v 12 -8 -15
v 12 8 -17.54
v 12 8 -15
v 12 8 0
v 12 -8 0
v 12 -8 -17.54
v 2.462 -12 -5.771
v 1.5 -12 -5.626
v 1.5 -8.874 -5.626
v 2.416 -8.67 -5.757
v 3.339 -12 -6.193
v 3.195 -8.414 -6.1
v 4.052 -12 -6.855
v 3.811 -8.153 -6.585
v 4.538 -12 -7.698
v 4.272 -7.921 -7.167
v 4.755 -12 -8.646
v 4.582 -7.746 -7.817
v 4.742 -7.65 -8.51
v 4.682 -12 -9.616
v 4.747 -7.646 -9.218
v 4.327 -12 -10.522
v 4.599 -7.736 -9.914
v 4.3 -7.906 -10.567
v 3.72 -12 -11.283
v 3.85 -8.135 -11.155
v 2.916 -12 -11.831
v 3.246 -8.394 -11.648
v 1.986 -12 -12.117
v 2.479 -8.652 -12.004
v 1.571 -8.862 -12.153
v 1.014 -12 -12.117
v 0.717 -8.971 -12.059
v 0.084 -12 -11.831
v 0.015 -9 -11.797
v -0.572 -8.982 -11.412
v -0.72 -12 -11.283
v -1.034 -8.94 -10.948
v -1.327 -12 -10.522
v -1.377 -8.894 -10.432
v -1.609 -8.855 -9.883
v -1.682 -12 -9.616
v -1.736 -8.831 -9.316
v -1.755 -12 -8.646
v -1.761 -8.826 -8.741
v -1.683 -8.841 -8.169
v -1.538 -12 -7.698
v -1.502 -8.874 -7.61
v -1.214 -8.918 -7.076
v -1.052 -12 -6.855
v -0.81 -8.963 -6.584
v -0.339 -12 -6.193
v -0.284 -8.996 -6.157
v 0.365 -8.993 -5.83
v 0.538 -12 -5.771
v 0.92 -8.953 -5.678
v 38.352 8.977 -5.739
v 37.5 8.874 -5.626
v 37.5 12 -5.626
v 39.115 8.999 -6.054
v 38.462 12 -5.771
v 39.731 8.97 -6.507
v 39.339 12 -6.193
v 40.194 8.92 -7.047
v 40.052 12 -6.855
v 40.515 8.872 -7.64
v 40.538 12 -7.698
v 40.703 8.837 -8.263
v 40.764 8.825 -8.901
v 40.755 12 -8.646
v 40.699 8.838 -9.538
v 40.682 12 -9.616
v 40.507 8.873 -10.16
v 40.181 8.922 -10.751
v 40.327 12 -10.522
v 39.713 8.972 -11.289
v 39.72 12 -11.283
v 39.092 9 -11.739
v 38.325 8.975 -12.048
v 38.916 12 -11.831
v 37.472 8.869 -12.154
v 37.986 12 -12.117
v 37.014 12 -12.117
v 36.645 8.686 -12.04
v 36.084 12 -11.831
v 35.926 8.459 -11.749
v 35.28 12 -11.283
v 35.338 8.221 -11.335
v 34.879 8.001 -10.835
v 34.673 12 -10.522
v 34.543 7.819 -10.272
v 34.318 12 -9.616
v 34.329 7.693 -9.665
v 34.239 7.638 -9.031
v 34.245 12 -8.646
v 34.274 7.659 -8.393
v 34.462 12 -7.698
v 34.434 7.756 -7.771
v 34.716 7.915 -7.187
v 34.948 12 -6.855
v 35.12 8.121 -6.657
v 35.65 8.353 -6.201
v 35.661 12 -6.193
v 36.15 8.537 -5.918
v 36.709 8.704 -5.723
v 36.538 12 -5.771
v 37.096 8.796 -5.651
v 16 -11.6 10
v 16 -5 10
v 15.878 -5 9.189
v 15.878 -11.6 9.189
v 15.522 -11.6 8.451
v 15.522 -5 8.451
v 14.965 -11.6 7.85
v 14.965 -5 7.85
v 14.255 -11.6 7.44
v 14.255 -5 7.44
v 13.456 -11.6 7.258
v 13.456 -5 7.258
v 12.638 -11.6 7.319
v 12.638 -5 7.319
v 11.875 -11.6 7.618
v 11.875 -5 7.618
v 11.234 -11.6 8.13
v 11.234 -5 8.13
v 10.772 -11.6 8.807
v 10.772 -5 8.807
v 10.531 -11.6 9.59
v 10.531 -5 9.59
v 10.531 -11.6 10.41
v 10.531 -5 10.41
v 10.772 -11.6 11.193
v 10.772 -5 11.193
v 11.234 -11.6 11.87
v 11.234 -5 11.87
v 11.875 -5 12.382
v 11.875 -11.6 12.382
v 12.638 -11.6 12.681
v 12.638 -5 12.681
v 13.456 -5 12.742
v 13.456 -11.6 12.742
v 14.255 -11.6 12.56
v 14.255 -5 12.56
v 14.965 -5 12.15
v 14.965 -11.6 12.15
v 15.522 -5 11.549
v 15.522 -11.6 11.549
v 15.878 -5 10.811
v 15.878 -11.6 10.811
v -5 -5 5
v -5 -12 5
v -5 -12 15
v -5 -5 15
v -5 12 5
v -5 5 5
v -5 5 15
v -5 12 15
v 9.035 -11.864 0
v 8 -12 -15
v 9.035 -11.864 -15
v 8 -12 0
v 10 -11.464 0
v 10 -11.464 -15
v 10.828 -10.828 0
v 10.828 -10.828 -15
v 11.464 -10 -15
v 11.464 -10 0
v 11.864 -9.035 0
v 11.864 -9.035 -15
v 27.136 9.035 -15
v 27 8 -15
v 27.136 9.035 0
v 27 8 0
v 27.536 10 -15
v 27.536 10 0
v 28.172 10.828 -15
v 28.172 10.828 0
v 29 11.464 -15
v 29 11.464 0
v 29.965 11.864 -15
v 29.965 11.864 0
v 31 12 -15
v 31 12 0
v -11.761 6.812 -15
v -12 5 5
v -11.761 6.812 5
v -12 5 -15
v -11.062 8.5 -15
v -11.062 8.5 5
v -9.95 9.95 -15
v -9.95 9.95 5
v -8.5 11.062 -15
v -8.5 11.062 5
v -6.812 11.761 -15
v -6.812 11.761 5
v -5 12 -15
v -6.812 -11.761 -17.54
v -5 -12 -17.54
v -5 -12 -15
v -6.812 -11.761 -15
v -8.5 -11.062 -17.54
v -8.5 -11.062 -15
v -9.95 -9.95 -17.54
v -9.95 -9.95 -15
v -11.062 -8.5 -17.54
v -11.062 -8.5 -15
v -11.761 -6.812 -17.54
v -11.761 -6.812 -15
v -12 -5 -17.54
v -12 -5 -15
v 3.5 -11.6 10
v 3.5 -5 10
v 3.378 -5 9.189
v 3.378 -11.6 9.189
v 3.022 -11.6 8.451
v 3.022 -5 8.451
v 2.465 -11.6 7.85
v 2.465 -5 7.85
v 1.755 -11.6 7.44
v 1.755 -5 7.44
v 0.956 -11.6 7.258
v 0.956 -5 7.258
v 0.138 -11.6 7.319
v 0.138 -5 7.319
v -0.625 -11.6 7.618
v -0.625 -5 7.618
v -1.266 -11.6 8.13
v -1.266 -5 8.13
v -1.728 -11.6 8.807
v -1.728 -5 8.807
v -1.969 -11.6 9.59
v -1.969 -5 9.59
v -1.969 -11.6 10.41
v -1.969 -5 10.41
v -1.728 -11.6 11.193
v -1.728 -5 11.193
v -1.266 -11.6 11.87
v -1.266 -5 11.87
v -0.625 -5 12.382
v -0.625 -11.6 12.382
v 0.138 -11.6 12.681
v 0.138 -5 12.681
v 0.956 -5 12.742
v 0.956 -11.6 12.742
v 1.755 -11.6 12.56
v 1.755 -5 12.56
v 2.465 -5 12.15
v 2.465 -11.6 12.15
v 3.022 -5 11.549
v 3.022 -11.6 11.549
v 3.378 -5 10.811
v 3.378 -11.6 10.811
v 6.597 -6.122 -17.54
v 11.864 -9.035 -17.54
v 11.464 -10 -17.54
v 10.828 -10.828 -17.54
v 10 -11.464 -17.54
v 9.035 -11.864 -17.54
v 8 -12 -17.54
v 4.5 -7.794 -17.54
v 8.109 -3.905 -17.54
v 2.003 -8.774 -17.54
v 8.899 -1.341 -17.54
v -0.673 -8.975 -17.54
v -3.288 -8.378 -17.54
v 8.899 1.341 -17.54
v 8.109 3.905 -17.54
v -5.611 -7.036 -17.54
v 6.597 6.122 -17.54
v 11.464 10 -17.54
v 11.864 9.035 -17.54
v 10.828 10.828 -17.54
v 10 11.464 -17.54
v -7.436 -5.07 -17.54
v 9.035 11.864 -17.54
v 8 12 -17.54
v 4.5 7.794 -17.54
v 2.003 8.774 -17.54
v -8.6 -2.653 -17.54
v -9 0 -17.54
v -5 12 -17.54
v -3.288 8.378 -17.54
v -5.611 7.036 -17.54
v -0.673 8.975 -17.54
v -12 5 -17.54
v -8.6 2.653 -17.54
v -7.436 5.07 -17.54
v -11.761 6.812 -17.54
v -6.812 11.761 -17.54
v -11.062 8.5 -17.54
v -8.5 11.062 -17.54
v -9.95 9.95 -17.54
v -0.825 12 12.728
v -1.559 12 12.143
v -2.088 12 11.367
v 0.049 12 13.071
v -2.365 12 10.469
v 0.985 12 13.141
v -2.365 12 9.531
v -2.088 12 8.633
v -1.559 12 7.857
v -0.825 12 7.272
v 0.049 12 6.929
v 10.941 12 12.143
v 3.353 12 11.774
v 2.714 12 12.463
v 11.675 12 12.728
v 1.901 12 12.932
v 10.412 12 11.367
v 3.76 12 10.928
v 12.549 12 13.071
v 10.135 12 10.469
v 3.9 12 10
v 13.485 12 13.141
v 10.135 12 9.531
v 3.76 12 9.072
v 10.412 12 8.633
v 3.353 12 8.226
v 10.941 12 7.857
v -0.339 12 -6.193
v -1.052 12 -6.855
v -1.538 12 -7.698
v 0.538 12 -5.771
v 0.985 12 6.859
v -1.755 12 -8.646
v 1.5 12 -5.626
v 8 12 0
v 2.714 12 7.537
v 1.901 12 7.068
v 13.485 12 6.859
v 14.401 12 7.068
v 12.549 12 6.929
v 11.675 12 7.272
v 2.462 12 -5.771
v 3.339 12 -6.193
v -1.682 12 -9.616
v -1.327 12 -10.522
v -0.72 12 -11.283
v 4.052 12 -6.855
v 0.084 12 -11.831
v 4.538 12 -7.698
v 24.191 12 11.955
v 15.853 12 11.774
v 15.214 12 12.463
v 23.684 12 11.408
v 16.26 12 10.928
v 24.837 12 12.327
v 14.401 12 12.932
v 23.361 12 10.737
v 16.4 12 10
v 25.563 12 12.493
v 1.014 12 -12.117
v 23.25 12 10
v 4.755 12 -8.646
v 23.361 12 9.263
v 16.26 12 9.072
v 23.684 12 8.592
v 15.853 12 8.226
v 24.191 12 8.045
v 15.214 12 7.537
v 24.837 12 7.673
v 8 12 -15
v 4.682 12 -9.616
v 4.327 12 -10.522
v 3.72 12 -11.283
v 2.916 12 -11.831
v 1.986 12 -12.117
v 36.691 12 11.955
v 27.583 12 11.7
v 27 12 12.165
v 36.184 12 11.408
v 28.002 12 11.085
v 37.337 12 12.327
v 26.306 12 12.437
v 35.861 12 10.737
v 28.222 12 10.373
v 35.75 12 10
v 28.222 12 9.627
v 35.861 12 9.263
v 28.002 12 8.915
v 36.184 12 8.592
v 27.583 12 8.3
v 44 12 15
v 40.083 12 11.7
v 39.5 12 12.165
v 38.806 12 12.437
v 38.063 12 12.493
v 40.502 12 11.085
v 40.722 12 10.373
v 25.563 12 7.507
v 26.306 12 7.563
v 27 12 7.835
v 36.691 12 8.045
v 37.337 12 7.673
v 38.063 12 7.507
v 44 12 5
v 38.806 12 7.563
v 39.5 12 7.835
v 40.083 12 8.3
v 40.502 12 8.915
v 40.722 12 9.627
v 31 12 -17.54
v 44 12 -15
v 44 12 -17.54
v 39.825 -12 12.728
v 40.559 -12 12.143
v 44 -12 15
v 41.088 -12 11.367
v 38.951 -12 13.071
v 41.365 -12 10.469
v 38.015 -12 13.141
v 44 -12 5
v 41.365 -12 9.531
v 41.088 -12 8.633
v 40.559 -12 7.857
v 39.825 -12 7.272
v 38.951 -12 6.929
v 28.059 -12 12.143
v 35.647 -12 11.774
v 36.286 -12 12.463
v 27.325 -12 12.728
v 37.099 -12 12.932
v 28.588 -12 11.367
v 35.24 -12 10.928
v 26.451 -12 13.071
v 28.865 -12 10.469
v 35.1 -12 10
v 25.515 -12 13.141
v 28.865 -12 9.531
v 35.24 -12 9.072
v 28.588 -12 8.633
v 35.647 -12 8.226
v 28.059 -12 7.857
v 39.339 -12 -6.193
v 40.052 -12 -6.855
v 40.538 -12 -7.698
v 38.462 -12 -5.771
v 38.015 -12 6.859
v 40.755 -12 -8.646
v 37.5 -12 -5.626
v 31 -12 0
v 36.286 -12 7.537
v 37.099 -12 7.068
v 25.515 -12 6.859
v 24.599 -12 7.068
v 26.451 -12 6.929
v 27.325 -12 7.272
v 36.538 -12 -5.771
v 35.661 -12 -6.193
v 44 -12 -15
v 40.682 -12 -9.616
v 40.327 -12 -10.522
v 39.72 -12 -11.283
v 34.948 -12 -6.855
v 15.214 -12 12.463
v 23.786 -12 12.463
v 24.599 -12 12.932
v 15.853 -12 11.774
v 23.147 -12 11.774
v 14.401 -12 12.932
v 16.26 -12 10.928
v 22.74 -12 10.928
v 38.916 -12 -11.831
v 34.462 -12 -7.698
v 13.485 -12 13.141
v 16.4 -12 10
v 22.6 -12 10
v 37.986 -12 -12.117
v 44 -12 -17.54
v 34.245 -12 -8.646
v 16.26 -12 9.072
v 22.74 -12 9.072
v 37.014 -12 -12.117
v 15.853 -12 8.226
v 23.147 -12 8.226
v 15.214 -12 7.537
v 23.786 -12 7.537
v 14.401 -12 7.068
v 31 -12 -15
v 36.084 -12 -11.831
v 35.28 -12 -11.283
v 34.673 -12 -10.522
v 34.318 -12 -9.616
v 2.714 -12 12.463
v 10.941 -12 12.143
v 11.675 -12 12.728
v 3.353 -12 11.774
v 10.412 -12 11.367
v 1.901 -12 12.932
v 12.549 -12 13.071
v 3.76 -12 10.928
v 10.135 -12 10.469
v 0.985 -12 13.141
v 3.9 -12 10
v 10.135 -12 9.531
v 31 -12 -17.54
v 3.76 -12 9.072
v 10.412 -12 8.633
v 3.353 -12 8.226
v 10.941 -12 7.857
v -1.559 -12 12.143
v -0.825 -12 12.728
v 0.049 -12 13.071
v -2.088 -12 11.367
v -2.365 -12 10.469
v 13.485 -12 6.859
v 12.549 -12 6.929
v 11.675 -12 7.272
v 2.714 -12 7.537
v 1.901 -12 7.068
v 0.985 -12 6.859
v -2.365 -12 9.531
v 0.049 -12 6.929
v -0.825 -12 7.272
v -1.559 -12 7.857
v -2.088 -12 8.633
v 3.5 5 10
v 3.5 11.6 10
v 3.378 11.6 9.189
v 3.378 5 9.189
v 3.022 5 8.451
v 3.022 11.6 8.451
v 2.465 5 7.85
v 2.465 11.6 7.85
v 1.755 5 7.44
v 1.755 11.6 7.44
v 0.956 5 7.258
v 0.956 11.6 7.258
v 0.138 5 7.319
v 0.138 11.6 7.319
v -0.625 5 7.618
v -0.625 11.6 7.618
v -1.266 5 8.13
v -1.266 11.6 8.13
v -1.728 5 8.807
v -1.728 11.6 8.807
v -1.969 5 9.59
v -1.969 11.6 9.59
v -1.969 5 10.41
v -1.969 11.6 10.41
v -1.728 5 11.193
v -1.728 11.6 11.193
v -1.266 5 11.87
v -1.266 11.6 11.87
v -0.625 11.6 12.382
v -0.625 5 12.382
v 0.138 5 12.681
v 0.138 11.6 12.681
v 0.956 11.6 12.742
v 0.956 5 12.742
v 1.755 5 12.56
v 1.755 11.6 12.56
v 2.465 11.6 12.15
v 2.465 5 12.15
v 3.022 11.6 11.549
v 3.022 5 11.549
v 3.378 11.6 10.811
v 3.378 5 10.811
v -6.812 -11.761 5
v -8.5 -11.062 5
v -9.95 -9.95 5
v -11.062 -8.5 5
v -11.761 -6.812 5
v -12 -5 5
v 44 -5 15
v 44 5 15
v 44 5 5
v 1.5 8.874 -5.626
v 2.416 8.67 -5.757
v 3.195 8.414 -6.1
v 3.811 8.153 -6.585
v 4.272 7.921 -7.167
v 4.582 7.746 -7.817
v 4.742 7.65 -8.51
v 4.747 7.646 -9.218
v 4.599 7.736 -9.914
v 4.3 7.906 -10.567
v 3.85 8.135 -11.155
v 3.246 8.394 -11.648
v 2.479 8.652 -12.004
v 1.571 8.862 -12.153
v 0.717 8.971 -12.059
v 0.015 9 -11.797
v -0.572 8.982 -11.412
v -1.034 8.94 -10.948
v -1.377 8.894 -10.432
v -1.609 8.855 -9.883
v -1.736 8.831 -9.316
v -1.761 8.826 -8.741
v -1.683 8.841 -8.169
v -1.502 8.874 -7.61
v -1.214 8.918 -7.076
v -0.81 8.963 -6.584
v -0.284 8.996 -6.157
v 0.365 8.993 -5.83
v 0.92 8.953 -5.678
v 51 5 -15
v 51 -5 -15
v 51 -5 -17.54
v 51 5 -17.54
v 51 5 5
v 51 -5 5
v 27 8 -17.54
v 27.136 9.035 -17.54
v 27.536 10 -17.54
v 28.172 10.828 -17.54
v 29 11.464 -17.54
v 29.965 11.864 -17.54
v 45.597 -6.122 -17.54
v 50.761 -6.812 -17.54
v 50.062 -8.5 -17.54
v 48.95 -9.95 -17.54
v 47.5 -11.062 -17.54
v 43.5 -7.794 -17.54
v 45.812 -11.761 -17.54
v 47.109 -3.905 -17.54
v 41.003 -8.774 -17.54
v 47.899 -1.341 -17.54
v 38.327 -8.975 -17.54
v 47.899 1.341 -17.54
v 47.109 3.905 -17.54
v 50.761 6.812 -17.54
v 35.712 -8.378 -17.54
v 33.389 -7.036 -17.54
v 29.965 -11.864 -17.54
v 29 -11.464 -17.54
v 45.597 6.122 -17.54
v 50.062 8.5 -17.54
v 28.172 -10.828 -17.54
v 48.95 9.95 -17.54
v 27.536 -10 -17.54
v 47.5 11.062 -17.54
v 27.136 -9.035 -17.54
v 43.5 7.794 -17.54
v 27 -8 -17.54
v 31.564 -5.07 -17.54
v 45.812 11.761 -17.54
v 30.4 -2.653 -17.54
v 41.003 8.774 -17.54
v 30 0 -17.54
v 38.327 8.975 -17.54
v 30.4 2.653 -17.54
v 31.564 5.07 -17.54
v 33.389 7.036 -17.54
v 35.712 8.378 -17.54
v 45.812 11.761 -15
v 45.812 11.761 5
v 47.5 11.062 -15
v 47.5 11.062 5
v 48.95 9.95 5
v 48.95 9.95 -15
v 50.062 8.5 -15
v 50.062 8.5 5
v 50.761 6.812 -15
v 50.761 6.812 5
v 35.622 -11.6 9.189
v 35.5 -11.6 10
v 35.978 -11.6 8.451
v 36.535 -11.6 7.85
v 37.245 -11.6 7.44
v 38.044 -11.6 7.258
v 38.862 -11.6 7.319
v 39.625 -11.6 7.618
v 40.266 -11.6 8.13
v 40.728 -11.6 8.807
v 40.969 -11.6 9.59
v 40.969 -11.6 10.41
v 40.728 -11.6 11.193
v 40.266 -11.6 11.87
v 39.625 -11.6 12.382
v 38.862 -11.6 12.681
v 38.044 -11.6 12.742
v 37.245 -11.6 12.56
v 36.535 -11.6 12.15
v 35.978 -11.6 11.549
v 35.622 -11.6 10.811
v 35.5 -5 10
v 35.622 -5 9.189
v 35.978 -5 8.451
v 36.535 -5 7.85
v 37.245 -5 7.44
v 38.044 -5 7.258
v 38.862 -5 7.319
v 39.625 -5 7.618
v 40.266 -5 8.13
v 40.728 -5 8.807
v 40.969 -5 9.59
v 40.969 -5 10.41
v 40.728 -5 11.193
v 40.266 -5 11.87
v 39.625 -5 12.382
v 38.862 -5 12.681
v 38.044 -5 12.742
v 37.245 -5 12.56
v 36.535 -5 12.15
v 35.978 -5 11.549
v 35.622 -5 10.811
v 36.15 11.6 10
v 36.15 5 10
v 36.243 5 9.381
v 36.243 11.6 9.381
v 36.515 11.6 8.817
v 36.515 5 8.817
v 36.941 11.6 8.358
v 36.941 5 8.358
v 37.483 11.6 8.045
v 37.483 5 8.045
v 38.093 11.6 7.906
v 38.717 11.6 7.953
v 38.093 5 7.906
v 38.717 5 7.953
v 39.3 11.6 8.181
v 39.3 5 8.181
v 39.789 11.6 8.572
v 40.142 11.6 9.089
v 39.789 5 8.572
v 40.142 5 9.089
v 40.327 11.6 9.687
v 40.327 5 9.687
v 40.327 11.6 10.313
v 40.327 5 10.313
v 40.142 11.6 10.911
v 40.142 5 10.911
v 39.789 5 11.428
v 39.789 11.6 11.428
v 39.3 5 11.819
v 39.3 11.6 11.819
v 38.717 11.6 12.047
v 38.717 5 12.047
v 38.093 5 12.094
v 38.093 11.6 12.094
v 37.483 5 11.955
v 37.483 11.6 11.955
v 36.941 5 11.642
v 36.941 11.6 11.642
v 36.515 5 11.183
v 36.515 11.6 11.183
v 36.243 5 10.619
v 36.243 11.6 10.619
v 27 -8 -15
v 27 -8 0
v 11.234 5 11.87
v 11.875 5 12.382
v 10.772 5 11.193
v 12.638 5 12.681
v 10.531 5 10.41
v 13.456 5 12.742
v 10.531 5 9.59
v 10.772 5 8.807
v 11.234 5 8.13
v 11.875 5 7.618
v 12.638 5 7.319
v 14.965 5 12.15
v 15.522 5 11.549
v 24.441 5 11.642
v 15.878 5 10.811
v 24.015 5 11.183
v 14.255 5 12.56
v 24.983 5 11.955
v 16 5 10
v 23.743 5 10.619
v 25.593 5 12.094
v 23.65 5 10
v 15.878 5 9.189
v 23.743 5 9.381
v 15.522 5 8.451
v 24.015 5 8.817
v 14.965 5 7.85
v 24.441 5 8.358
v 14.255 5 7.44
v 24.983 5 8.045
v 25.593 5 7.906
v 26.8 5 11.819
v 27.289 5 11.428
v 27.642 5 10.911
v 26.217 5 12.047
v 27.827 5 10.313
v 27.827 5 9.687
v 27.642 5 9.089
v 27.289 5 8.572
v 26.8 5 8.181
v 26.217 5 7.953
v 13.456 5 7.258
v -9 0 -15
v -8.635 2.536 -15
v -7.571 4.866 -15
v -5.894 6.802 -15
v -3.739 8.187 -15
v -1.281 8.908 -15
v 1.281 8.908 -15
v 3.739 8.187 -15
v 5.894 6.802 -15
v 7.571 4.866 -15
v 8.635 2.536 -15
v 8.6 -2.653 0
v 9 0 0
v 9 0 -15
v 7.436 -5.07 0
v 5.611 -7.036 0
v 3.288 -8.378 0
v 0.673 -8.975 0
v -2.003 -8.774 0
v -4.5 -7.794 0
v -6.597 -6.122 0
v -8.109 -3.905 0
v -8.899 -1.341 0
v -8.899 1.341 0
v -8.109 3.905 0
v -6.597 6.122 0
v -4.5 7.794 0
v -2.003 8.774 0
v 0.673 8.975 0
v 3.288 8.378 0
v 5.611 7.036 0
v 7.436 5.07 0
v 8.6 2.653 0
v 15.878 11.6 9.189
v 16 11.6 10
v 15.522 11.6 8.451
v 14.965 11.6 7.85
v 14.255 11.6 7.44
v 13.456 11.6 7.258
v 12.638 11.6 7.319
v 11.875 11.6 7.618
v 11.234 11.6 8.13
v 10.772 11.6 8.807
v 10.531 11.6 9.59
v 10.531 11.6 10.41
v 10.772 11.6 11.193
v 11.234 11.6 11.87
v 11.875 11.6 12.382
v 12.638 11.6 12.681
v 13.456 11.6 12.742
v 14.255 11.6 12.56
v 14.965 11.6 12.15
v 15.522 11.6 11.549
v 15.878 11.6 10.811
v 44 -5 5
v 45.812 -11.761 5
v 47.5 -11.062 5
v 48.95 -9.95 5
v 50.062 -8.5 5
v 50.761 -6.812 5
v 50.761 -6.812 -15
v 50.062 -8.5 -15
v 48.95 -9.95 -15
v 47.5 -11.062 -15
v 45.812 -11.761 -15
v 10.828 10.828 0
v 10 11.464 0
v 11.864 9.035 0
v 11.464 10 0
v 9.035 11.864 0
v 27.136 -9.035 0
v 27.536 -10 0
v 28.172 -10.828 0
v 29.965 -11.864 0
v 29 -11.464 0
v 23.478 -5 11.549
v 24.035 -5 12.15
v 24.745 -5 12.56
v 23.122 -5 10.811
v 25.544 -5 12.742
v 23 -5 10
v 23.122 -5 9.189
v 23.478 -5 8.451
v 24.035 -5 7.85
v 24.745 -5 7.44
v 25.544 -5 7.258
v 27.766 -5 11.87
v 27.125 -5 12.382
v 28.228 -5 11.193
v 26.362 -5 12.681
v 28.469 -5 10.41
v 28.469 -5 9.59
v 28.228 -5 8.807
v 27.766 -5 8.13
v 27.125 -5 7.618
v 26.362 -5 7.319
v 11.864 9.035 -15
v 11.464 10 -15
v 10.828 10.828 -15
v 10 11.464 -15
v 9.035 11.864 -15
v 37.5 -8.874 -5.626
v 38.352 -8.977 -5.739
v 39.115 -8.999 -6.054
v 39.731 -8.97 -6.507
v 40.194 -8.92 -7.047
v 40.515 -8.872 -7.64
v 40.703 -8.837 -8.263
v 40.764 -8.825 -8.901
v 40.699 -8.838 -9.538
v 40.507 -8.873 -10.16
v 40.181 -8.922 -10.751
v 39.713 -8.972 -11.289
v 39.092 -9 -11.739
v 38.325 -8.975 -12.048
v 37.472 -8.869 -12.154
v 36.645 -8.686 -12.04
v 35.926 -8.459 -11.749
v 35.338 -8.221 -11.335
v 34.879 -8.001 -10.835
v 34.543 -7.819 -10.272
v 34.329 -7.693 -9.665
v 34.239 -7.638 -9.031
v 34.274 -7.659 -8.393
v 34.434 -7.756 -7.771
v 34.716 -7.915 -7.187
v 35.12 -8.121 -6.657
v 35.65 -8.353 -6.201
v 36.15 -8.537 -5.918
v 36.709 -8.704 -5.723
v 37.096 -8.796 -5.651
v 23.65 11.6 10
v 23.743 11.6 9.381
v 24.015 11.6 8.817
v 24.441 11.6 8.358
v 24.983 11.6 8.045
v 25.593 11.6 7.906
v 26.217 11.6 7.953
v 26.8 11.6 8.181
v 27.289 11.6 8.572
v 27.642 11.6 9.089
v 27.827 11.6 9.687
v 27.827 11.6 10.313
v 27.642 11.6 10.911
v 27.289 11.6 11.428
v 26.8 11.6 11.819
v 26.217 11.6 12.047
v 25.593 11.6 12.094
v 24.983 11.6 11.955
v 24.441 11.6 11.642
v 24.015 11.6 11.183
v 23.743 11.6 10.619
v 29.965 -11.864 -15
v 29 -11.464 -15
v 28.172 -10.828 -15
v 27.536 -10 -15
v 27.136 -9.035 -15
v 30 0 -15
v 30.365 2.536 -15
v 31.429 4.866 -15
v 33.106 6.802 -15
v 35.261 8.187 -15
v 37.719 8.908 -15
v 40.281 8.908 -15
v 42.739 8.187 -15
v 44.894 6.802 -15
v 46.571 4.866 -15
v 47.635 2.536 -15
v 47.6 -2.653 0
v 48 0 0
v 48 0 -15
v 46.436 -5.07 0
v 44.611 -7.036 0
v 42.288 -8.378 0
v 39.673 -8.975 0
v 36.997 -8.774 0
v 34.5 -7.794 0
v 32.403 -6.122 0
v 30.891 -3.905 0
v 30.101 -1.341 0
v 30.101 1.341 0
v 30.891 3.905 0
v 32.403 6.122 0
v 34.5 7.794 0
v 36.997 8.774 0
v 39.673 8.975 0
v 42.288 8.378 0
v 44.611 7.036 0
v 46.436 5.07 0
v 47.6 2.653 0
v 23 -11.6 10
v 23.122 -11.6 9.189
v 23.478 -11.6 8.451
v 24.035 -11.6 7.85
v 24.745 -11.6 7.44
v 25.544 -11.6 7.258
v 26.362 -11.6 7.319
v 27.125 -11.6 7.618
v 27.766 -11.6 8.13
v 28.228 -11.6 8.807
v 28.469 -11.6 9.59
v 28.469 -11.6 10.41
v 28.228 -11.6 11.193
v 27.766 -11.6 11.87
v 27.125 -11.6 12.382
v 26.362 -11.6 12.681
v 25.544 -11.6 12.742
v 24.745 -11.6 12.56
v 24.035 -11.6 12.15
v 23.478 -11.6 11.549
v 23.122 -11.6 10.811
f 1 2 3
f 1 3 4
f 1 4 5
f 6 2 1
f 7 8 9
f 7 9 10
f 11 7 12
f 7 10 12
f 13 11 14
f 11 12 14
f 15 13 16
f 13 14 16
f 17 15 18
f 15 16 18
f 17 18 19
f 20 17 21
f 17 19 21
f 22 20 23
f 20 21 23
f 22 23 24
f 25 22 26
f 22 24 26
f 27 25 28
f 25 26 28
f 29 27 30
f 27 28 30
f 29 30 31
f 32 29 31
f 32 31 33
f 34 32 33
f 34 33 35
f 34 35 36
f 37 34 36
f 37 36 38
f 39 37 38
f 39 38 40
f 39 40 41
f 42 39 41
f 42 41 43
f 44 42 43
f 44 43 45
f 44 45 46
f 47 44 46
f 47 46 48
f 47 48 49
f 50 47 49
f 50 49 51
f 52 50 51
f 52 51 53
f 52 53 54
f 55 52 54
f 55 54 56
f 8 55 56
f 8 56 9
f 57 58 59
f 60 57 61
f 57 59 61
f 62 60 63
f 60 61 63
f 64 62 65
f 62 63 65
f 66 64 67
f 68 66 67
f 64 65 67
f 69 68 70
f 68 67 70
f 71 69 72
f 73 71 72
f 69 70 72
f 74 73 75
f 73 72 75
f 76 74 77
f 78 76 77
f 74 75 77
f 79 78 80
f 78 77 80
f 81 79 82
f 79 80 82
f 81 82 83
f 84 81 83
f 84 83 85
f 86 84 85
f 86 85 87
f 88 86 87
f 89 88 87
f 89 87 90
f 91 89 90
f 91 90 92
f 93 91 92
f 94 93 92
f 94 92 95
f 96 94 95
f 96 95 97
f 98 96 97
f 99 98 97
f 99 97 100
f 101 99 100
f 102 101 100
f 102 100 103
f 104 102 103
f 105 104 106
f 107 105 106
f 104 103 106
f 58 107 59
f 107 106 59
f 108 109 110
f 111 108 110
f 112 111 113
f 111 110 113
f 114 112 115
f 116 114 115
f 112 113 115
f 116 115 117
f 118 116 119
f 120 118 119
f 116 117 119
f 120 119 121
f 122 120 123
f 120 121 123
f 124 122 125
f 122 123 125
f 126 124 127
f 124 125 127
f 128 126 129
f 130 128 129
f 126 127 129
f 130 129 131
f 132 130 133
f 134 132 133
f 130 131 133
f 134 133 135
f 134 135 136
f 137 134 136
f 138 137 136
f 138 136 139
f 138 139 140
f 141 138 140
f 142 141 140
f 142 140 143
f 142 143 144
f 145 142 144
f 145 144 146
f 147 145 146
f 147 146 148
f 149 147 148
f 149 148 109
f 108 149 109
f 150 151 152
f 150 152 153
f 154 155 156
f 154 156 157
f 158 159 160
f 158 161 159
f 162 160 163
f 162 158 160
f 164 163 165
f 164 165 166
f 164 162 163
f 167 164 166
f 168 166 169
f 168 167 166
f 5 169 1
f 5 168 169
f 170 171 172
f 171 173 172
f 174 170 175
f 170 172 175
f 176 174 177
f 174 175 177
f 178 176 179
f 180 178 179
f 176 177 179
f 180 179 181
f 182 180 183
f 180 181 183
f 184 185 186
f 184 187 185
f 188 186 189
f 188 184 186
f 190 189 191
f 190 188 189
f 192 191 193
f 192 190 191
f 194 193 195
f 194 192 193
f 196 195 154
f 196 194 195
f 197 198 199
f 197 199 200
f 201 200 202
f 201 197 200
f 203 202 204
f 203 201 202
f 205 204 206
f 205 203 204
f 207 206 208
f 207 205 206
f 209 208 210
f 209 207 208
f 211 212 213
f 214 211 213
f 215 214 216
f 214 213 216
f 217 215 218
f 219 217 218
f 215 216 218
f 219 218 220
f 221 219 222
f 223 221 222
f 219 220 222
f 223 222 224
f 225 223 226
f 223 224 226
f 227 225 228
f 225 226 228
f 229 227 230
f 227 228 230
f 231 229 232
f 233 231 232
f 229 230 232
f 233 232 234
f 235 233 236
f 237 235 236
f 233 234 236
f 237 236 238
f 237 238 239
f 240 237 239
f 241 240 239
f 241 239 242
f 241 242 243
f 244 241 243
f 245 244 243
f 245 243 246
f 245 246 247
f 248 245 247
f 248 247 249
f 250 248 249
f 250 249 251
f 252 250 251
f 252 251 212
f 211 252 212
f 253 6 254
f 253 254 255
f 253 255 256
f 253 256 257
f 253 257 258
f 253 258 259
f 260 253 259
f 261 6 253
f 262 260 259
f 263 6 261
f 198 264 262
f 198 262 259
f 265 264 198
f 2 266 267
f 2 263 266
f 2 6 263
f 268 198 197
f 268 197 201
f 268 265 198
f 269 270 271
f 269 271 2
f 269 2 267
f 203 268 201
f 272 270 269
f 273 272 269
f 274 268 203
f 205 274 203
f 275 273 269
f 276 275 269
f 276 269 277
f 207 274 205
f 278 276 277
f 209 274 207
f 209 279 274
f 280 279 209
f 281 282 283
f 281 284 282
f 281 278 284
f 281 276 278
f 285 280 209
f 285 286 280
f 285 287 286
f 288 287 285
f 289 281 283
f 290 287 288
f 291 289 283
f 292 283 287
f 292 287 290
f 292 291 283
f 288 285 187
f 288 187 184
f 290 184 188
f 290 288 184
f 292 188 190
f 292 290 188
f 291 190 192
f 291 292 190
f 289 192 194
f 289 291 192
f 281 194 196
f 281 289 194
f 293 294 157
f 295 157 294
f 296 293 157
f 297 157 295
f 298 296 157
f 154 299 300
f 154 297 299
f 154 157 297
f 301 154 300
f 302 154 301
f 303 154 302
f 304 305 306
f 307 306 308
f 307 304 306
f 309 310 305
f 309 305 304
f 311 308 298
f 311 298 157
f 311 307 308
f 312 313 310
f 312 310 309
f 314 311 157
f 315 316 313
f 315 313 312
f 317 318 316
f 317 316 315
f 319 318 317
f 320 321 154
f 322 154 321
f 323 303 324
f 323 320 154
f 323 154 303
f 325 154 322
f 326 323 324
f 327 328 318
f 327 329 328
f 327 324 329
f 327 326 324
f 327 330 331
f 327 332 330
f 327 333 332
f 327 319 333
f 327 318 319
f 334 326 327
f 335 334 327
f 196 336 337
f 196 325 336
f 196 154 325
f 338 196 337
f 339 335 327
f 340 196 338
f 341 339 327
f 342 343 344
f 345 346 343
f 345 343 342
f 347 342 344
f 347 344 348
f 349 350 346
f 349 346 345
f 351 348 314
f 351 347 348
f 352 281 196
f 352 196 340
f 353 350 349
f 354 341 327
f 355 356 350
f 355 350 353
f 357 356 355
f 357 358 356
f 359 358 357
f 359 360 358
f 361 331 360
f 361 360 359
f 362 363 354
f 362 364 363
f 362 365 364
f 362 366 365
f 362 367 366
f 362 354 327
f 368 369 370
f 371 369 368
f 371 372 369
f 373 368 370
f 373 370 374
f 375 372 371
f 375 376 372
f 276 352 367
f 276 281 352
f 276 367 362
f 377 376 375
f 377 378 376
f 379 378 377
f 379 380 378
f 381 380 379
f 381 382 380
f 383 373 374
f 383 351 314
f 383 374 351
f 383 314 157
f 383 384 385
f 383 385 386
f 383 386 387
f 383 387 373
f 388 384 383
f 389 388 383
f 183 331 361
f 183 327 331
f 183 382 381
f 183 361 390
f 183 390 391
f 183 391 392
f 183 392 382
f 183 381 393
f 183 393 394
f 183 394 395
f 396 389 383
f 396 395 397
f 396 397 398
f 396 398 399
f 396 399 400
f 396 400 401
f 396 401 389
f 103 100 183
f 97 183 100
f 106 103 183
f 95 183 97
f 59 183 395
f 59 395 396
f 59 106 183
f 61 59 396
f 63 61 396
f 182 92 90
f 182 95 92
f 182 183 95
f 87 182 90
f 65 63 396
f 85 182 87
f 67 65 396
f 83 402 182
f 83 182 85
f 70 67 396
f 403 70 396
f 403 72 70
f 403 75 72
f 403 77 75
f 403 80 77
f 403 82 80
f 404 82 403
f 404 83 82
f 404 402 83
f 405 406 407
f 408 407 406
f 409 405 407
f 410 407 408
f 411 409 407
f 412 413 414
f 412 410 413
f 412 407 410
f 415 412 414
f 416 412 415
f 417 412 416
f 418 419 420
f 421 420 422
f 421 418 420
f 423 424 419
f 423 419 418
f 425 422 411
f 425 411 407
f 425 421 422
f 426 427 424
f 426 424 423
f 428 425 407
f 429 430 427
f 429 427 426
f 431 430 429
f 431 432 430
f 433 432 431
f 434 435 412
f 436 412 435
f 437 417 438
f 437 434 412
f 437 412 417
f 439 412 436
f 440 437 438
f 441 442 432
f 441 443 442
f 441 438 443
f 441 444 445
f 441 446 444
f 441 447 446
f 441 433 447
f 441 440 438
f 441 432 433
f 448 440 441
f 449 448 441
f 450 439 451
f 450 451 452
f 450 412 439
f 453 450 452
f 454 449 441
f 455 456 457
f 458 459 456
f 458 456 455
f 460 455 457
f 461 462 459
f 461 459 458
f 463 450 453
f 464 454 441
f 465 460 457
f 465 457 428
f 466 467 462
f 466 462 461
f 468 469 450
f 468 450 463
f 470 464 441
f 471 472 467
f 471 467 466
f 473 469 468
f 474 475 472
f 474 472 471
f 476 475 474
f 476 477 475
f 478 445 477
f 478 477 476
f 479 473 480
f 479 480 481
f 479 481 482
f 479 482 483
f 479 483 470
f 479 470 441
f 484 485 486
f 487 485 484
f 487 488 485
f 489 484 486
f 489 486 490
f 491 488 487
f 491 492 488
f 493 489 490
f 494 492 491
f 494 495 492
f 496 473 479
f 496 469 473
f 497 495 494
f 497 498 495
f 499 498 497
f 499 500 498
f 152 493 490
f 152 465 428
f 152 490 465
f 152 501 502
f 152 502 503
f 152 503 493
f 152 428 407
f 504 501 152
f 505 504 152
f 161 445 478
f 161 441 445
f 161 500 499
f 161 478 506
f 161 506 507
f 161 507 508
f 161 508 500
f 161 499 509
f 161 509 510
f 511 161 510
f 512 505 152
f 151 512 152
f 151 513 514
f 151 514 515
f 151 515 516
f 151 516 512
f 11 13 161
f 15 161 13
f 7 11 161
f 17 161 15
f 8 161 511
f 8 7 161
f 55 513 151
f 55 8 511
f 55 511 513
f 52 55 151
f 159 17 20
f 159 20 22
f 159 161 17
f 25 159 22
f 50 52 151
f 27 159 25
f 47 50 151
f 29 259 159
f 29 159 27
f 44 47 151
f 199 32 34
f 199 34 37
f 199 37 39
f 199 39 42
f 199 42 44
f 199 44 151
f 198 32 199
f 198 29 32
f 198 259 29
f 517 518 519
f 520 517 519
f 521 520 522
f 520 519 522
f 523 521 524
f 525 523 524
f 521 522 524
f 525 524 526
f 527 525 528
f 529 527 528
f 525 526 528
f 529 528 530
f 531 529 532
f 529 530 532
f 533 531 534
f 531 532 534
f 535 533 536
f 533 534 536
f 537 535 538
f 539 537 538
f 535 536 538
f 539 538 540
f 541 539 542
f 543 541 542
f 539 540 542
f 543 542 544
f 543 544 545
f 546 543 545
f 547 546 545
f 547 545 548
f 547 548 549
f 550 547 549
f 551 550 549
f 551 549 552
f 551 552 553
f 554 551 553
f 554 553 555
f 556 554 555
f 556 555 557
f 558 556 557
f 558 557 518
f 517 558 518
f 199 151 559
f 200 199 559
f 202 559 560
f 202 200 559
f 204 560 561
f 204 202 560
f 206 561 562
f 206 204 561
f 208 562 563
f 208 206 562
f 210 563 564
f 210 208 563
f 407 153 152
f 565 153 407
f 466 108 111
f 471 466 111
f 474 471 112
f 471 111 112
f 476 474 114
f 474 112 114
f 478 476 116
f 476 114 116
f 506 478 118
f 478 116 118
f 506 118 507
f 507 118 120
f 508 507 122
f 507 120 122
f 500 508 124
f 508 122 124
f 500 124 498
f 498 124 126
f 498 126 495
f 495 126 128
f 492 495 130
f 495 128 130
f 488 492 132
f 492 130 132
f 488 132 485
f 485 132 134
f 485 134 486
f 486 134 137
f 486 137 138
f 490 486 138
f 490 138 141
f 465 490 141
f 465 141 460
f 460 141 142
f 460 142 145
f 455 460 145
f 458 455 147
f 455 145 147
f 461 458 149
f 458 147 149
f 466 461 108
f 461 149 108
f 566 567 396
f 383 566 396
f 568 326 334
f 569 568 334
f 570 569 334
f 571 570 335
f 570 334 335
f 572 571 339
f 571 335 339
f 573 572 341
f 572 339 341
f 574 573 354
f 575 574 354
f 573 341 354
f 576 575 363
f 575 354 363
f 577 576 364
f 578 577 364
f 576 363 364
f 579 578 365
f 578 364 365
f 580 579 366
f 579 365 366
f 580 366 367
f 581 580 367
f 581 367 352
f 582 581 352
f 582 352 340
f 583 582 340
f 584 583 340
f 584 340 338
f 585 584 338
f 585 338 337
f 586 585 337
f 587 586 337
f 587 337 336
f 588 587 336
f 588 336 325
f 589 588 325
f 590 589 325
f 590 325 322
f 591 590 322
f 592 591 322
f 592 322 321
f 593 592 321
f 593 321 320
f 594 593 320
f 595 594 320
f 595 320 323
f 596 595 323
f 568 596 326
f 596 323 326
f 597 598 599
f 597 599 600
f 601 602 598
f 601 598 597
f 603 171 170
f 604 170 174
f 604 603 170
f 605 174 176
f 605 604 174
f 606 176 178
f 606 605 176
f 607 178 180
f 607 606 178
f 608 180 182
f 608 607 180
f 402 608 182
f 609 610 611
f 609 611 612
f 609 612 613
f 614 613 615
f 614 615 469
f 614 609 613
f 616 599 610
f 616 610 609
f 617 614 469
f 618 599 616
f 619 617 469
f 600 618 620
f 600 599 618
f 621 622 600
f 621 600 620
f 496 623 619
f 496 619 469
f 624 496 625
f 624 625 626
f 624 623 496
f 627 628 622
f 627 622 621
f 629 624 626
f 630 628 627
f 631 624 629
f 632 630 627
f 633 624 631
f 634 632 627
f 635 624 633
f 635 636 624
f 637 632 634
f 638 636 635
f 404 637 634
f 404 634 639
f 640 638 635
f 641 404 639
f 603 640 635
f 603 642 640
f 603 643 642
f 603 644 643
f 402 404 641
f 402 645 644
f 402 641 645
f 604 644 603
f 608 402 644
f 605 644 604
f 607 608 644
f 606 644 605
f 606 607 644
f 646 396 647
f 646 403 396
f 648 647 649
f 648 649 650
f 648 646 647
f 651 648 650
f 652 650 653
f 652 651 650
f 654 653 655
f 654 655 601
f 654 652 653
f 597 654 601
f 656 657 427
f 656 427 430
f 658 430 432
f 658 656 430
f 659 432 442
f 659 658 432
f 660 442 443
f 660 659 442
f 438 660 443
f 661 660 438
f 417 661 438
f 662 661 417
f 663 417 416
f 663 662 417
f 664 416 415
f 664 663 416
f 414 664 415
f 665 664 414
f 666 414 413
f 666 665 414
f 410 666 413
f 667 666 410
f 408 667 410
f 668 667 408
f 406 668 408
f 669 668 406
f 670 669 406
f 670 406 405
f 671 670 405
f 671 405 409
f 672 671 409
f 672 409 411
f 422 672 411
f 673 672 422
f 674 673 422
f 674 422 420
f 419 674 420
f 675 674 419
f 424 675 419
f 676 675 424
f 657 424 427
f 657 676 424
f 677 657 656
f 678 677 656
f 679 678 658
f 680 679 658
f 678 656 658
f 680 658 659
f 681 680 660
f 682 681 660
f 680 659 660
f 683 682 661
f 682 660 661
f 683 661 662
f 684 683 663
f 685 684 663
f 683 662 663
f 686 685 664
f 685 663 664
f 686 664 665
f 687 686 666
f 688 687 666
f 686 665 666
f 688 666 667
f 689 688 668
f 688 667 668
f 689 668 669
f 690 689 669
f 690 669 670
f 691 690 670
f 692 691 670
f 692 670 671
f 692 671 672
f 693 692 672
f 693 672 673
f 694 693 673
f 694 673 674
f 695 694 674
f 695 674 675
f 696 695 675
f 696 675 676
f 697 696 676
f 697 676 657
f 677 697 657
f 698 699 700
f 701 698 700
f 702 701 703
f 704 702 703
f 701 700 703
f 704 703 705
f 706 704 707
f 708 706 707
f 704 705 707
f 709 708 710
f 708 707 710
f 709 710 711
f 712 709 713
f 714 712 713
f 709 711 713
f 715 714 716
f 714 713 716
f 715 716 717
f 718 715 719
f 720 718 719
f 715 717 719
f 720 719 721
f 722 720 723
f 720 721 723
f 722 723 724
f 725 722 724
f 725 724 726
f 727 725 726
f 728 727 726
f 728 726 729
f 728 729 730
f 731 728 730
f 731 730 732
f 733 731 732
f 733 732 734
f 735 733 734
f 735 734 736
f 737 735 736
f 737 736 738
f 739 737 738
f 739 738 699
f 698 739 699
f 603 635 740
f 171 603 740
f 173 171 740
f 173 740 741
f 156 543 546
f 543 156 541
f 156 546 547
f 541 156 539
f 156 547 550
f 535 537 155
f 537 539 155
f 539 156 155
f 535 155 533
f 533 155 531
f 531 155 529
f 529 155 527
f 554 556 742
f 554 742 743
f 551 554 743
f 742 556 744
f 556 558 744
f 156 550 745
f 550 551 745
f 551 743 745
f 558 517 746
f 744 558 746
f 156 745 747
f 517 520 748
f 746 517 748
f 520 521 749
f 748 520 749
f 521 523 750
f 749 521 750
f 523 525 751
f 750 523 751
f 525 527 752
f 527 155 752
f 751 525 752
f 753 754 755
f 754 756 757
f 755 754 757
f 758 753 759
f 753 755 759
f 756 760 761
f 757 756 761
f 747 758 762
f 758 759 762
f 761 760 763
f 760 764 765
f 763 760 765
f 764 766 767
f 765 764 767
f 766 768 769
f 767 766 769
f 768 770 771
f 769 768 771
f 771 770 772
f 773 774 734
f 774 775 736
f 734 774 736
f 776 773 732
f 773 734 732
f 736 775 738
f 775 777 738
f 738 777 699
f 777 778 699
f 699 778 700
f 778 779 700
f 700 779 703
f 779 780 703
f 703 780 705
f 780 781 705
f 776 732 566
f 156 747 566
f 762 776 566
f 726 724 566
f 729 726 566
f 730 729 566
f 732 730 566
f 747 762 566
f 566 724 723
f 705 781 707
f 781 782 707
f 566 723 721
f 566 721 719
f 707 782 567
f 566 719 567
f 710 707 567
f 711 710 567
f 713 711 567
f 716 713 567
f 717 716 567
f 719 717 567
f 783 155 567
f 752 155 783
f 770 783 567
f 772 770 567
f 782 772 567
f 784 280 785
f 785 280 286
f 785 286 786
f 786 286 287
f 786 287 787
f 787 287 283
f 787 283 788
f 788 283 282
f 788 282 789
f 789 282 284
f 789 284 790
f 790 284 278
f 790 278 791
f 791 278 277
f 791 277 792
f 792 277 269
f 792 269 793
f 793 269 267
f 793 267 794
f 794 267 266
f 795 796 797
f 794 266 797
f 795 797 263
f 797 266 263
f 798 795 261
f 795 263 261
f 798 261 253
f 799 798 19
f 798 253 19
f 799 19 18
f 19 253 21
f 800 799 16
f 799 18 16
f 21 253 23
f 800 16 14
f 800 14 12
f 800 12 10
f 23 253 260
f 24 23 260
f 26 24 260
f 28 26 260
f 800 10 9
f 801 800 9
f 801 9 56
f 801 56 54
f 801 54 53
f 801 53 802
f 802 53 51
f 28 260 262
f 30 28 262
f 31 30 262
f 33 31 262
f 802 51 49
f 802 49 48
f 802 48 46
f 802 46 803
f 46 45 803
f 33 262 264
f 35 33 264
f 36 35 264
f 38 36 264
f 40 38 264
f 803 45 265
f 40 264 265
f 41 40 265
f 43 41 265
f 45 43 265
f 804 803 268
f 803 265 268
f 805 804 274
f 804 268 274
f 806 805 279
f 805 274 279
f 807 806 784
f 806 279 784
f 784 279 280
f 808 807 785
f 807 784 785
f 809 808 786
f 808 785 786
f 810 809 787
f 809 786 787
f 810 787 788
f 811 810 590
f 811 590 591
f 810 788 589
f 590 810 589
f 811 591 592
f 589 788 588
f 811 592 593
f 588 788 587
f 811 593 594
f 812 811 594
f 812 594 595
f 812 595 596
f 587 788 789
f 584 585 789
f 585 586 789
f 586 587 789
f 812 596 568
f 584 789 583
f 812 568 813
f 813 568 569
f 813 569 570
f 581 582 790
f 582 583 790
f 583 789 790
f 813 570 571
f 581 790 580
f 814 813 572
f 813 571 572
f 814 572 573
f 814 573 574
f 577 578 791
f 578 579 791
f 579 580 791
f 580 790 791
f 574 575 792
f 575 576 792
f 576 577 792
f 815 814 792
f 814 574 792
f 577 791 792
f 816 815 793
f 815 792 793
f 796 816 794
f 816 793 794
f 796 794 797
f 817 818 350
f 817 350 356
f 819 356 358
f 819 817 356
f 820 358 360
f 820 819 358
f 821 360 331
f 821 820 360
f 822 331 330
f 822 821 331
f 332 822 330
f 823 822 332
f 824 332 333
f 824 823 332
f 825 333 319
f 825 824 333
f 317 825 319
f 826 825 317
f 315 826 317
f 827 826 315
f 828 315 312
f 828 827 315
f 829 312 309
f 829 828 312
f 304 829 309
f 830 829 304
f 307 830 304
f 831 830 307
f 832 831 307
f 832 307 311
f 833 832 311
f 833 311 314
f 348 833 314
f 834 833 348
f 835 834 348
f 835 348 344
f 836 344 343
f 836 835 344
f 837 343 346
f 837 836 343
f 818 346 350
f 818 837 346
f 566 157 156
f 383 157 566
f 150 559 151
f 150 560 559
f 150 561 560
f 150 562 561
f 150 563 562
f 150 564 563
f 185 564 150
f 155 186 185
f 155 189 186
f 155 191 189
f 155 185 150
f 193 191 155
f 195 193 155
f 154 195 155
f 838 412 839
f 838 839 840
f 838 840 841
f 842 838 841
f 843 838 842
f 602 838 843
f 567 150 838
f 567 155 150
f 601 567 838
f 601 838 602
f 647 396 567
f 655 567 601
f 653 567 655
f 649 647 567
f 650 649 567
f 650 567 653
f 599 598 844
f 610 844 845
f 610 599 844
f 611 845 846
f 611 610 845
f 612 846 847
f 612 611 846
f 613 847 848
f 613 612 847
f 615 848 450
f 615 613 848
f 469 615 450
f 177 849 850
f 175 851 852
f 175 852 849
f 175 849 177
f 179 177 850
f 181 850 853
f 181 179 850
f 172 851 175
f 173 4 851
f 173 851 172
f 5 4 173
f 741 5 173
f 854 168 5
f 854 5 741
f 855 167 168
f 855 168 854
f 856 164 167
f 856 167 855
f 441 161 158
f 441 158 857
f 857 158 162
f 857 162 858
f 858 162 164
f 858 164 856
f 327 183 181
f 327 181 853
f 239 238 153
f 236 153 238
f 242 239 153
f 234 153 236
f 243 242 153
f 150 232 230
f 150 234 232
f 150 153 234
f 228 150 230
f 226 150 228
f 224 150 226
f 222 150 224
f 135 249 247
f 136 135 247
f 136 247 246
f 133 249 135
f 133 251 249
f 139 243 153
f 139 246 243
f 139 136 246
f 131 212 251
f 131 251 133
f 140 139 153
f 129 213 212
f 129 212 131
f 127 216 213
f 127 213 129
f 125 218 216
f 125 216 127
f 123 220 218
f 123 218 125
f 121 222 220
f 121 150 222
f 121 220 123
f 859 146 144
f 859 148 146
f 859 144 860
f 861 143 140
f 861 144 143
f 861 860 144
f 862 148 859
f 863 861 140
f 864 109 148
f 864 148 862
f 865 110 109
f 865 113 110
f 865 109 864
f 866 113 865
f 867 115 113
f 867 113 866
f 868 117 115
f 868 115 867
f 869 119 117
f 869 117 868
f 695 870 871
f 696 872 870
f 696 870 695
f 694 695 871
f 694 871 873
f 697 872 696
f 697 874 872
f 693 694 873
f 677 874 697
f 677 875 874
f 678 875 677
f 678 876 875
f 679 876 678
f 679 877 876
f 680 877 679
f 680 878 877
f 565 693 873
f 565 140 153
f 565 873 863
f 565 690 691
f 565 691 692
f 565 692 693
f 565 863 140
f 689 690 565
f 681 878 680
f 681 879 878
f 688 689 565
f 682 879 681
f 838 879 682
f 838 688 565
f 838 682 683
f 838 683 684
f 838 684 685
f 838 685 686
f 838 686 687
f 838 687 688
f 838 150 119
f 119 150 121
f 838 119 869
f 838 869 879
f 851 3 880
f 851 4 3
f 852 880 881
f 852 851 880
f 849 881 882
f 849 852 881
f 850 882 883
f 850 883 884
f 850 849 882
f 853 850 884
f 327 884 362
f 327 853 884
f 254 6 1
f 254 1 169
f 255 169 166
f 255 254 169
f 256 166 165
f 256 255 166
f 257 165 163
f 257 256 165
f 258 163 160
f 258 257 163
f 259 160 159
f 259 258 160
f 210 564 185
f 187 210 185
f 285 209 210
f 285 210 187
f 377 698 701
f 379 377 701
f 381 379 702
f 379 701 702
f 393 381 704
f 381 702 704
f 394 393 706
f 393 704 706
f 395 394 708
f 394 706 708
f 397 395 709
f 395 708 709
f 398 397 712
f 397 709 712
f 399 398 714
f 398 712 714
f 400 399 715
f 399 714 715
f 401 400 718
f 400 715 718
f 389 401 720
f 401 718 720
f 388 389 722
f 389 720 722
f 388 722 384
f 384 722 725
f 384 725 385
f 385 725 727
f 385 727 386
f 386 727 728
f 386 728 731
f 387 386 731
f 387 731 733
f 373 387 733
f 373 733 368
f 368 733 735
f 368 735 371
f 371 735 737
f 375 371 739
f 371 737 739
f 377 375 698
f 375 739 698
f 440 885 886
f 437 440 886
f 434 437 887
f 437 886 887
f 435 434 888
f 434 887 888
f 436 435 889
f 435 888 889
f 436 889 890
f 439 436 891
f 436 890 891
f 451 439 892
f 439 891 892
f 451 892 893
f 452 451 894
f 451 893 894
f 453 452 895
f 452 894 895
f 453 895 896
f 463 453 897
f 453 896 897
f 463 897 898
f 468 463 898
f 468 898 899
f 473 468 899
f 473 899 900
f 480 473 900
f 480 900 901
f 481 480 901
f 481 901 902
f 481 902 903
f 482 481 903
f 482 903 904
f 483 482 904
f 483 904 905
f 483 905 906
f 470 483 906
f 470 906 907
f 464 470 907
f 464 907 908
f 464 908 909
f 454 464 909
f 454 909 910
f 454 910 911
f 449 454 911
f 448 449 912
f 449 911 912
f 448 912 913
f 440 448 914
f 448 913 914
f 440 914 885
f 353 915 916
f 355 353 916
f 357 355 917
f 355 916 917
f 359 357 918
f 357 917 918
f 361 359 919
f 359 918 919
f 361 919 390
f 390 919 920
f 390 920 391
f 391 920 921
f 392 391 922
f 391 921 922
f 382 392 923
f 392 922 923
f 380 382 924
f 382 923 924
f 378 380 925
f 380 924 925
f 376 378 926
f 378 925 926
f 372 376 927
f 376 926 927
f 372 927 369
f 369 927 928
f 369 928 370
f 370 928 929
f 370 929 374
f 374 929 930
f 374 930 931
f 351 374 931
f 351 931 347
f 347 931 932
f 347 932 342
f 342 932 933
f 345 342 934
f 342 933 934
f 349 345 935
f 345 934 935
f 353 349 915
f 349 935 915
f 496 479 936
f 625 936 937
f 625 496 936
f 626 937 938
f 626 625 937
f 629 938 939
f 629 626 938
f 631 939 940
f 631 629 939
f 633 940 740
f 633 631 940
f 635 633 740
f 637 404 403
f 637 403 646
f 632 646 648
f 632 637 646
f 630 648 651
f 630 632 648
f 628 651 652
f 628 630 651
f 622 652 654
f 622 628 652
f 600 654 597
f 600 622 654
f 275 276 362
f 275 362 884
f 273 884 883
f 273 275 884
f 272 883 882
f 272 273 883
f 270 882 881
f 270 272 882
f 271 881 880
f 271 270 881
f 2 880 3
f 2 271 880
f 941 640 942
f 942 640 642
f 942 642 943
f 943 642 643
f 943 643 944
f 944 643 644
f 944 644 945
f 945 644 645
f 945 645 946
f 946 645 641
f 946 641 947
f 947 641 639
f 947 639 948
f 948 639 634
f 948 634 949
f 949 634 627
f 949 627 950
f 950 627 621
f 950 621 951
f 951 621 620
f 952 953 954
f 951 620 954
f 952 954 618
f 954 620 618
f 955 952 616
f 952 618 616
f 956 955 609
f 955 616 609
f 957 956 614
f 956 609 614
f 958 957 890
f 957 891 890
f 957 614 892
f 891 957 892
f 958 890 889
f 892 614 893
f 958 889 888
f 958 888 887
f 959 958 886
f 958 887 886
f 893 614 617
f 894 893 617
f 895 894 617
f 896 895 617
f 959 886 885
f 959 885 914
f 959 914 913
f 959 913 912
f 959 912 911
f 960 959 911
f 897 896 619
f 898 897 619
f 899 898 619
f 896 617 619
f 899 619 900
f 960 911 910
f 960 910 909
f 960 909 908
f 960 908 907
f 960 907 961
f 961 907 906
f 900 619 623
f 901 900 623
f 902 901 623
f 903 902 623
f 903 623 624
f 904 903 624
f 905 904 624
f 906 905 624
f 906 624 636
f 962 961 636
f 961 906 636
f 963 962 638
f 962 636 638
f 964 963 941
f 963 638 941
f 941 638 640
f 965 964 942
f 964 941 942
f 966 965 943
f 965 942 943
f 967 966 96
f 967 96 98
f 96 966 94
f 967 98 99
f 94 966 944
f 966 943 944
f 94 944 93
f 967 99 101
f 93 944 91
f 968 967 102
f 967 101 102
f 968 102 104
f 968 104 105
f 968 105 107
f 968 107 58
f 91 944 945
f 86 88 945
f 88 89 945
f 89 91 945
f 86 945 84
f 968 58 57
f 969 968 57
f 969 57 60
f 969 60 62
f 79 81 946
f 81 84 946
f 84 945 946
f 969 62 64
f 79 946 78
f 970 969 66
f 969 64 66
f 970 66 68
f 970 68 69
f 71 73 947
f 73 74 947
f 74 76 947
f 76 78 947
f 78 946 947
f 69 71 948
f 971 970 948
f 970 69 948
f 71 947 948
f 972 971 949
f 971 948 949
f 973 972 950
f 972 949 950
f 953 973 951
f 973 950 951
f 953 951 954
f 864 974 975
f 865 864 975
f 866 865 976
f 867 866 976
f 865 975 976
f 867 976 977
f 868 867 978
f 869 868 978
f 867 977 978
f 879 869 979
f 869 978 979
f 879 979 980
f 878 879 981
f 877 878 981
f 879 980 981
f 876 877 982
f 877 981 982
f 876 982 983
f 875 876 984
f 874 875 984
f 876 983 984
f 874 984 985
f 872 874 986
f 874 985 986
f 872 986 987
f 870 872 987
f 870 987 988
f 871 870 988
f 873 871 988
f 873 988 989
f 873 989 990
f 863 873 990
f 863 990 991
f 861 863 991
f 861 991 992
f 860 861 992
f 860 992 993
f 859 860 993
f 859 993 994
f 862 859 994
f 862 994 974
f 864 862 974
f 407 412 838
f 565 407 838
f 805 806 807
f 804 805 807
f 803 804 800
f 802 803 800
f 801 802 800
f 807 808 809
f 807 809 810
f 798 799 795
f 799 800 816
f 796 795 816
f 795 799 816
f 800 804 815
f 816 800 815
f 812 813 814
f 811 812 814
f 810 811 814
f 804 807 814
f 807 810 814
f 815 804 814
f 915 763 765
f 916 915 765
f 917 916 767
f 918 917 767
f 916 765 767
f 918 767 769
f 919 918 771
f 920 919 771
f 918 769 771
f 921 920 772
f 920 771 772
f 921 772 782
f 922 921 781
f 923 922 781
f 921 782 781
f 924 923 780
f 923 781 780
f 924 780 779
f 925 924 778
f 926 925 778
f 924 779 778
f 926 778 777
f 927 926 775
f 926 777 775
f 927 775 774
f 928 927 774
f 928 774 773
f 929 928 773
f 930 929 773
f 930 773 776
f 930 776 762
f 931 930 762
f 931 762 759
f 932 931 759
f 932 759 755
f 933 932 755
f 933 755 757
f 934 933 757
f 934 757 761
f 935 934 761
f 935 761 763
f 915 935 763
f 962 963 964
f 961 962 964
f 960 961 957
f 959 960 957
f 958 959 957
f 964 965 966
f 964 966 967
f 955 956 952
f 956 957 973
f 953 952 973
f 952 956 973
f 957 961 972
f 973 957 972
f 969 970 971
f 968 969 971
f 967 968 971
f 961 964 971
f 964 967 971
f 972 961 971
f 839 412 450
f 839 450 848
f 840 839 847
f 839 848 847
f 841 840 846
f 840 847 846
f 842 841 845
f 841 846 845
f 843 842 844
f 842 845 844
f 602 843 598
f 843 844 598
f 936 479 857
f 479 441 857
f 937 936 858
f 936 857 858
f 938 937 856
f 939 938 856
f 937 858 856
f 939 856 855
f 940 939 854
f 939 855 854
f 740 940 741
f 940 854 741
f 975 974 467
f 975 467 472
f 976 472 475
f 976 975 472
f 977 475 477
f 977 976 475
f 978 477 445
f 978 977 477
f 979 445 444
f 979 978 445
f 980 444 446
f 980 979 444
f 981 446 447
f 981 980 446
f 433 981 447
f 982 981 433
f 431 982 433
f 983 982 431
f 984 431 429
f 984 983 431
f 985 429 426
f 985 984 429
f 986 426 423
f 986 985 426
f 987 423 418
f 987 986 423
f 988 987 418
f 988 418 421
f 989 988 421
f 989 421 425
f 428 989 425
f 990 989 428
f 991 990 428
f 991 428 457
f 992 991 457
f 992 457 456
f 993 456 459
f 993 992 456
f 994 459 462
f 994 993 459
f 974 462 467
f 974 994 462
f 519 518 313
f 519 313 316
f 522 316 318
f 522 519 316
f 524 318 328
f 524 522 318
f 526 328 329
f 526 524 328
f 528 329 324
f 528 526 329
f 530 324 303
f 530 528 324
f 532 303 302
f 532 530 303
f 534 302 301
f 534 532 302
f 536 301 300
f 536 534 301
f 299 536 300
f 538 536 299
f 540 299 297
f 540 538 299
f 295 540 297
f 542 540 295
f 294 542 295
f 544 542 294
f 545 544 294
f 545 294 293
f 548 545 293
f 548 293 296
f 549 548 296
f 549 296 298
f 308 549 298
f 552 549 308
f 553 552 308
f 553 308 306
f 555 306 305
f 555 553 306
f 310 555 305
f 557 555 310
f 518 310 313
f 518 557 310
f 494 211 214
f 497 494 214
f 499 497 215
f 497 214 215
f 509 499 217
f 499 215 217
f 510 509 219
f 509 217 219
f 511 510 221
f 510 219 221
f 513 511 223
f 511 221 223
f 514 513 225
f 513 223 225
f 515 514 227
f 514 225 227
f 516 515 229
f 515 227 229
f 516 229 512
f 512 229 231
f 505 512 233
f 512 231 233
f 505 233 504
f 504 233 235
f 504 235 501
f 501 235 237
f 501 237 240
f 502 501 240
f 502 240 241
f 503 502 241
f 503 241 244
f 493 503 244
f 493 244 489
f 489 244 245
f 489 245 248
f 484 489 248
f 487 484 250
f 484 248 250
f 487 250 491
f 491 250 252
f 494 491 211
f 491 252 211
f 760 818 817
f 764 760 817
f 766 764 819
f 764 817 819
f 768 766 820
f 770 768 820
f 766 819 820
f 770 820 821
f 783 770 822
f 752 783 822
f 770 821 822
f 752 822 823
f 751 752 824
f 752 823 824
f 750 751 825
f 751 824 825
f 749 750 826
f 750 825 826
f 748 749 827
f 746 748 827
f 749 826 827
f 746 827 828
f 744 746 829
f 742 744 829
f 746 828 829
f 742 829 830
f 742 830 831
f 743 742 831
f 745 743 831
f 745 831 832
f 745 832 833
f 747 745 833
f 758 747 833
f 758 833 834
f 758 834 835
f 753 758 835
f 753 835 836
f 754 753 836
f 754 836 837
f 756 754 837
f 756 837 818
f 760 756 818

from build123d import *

# Parameters (mm, degrees)
SKETCH1_W                  = 63
SKETCH1_H                  = 24
BOSS_EXTRUDE1_DEPTH        = 20
SKETCH2_W                  = 15
SKETCH2_H                  = 15
CUT_EXTRUDE1_DEPTH         = 59.326666286
SKETCH3_W                  = 49
SKETCH3_H                  = 7
BOSS_EXTRUDE2_DEPTH        = 10
SKETCH4_W                  = 49
SKETCH4_H                  = 7
BOSS_EXTRUDE3_DEPTH        = 10
HOLE1_D                    = 18
HOLE1_DEPTH                = 15
F_6_CLEARANCE_HOLE1_D      = 4.2
F_6_CLEARANCE_HOLE1_DEPTH  = 7
F_6_CLEARANCE_HOLE2_D      = 4.2
F_6_CLEARANCE_HOLE2_DEPTH  = 7
F_10_CLEARANCE_HOLE1_D     = 5.5
F_10_CLEARANCE_HOLE1_DEPTH = 24
F_10_CLEARANCE_HOLE2_D     = 5.5
F_10_CLEARANCE_HOLE2_DEPTH = 7
CHAMFER1_SIZE              = 0.4
FILLET1_R                  = 4
FILLET2_R                  = 7
BOSS_EXTRUDE5_START        = 2.54
SKETCH20_R                 = 9
BOSS_EXTRUDE5_DEPTH        = 2.54
SKETCH21_R                 = 3.2639
CUT_EXTRUDE4_DEPTH         = 60.030937651


with BuildPart() as part:
    # Sketch1 → Boss-Extrude1 (new body)
    with BuildSketch(Plane.XY.offset(5)):
        with Locations((19.5, 0)):
            Rectangle(SKETCH1_W, SKETCH1_H)
    extrude(amount=-BOSS_EXTRUDE1_DEPTH)

    # Sketch2 → Cut-Extrude1 (cut, through all)
    with BuildSketch(Plane.XZ.offset(12)):
        with Locations((19.5, -7.5)):
            Rectangle(SKETCH2_W, SKETCH2_H)
    extrude(amount=-CUT_EXTRUDE1_DEPTH, mode=Mode.SUBTRACT)

    # Sketch3 → Boss-Extrude2 (add)
    with BuildSketch(Plane.XY.offset(5)):
        with Locations((19.5, -8.5)):
            Rectangle(SKETCH3_W, SKETCH3_H)
    extrude(amount=BOSS_EXTRUDE2_DEPTH)

    # Sketch4 → Boss-Extrude3 (add)
    with BuildSketch(Plane.XY.offset(5)):
        with Locations((19.5, 8.5)):
            Rectangle(SKETCH4_W, SKETCH4_H)
    extrude(amount=BOSS_EXTRUDE3_DEPTH)

    # Hole1
    with Locations(Plane(origin=(0, 0, -15), x_dir=(-1, 0, 0), z_dir=(0, 0, -1))):
        with Locations((0, 0), (-39, 0)):
            Hole(HOLE1_D / 2, depth=HOLE1_DEPTH)

    # #6 Clearance Hole1
    with Locations(Plane(origin=(0, 5, 0), x_dir=(-1, 0, 0), z_dir=(0, -1, 0))):
        with Locations((-0.75, -10)):
            Hole(F_6_CLEARANCE_HOLE1_D / 2, depth=F_6_CLEARANCE_HOLE1_DEPTH)

    # #6 Clearance Hole2
    with Locations(Plane(origin=(0, 12, 0), x_dir=(1, 0, 0), z_dir=(0, 1, 0))):
        with Locations((38.25, -10), (25.75, -10), (13.25, -10)):
            Hole(F_6_CLEARANCE_HOLE2_D / 2, depth=F_6_CLEARANCE_HOLE2_DEPTH)

    # #10 Clearance Hole1
    with Locations(Plane(origin=(0, -12, 0), x_dir=(-1, 0, 0), z_dir=(0, -1, 0))):
        with Locations((-13.25, -10), (-0.75, -10)):
            Hole(F_10_CLEARANCE_HOLE1_D / 2, depth=F_10_CLEARANCE_HOLE1_DEPTH)

    # #10 Clearance Hole2
    with Locations(Plane(origin=(0, -5, 0), x_dir=(1, 0, 0), z_dir=(0, 1, 0))):
        with Locations((38.25, -10), (25.75, -10)):
            Hole(F_10_CLEARANCE_HOLE2_D / 2, depth=F_10_CLEARANCE_HOLE2_DEPTH)

    # Chamfer1
    chamfer1_edges = [part.edges().sort_by_distance(p)[0] for p in [
        (10.5, 12, 10),
        (10.5, -12, 10),
        (28.5, -12, 10),
        (41, -12, 10),
        (27.85, 12, 10),
        (40.35, 12, 10),
        (-2, 12, 10),
        (-2, -12, 10),
    ]]
    chamfer(chamfer1_edges, length=CHAMFER1_SIZE)

    # Fillet1
    fillet1_edges = [part.edges().sort_by_distance(p)[0] for p in [
        (12, 12, -7.5),
        (27, 12, -7.5),
        (12, -12, -7.5),
        (27, -12, -7.5),
    ]]
    fillet(fillet1_edges, radius=FILLET1_R)

    # Fillet2
    fillet2_edges = [part.edges().sort_by_distance(p)[0] for p in [
        (51, -12, -5),
        (-12, 12, -5),
        (51, 12, -5),
        (-12, -12, -5),
    ]]
    fillet(fillet2_edges, radius=FILLET2_R)

    # Sketch20 → Boss-Extrude5 (add)
    # profile 1 of 2: a face of its own
    with BuildSketch(Plane(origin=(0, 0, -15), x_dir=(-1, 0, 0), z_dir=(0, 0, -1)).offset(BOSS_EXTRUDE5_START)):
        with BuildLine():
            Line((12, -5), (12, 5))
            ThreePointArc((12, 5), (9.949747468, 9.949747468), (5, 12))
            Line((5, 12), (-8, 12))
            ThreePointArc((-8, 12), (-10.828427125, 10.828427125), (-12, 8))
            Line((-12, 8), (-12, -8))
            ThreePointArc((-12, -8), (-10.828427125, -10.828427125), (-8, -12))
            Line((-8, -12), (5, -12))
            ThreePointArc((5, -12), (9.949747468, -9.949747468), (12, -5))
        make_face()
        Circle(SKETCH20_R, mode=Mode.SUBTRACT)
    # profile 2 of 2: a face of its own
    with BuildSketch(Plane(origin=(0, 0, -15), x_dir=(-1, 0, 0), z_dir=(0, 0, -1)).offset(BOSS_EXTRUDE5_START)):
        with BuildLine():
            Line((-51, 5), (-51, -5))
            ThreePointArc((-51, -5), (-48.949747468, -9.949747468), (-44, -12))
            Line((-44, -12), (-31, -12))
            ThreePointArc((-31, -12), (-28.171572875, -10.828427125), (-27, -8))
            Line((-27, -8), (-27, 8))
            ThreePointArc((-27, 8), (-28.171572875, 10.828427125), (-31, 12))
            Line((-31, 12), (-44, 12))
            ThreePointArc((-44, 12), (-48.949747468, 9.949747468), (-51, 5))
        make_face()
        with Locations((-39, 0)):
            Circle(SKETCH20_R, mode=Mode.SUBTRACT)
    extrude(amount=-BOSS_EXTRUDE5_DEPTH)

    # Sketch21 → Cut-Extrude4 (cut, through all)
    with BuildSketch(Plane(origin=(0, 12, 0), x_dir=(1, 0, 0), z_dir=(0, 1, 0))):
        with Locations(Location((37.5, 8.89, 0), (0, 0, 270))):
            Circle(SKETCH21_R)
        with Locations(Location((1.5, 8.89, 0), (0, 0, 270))):
            Circle(SKETCH21_R)
    extrude(amount=-CUT_EXTRUDE4_DEPTH, mode=Mode.SUBTRACT)


solid = part.part
